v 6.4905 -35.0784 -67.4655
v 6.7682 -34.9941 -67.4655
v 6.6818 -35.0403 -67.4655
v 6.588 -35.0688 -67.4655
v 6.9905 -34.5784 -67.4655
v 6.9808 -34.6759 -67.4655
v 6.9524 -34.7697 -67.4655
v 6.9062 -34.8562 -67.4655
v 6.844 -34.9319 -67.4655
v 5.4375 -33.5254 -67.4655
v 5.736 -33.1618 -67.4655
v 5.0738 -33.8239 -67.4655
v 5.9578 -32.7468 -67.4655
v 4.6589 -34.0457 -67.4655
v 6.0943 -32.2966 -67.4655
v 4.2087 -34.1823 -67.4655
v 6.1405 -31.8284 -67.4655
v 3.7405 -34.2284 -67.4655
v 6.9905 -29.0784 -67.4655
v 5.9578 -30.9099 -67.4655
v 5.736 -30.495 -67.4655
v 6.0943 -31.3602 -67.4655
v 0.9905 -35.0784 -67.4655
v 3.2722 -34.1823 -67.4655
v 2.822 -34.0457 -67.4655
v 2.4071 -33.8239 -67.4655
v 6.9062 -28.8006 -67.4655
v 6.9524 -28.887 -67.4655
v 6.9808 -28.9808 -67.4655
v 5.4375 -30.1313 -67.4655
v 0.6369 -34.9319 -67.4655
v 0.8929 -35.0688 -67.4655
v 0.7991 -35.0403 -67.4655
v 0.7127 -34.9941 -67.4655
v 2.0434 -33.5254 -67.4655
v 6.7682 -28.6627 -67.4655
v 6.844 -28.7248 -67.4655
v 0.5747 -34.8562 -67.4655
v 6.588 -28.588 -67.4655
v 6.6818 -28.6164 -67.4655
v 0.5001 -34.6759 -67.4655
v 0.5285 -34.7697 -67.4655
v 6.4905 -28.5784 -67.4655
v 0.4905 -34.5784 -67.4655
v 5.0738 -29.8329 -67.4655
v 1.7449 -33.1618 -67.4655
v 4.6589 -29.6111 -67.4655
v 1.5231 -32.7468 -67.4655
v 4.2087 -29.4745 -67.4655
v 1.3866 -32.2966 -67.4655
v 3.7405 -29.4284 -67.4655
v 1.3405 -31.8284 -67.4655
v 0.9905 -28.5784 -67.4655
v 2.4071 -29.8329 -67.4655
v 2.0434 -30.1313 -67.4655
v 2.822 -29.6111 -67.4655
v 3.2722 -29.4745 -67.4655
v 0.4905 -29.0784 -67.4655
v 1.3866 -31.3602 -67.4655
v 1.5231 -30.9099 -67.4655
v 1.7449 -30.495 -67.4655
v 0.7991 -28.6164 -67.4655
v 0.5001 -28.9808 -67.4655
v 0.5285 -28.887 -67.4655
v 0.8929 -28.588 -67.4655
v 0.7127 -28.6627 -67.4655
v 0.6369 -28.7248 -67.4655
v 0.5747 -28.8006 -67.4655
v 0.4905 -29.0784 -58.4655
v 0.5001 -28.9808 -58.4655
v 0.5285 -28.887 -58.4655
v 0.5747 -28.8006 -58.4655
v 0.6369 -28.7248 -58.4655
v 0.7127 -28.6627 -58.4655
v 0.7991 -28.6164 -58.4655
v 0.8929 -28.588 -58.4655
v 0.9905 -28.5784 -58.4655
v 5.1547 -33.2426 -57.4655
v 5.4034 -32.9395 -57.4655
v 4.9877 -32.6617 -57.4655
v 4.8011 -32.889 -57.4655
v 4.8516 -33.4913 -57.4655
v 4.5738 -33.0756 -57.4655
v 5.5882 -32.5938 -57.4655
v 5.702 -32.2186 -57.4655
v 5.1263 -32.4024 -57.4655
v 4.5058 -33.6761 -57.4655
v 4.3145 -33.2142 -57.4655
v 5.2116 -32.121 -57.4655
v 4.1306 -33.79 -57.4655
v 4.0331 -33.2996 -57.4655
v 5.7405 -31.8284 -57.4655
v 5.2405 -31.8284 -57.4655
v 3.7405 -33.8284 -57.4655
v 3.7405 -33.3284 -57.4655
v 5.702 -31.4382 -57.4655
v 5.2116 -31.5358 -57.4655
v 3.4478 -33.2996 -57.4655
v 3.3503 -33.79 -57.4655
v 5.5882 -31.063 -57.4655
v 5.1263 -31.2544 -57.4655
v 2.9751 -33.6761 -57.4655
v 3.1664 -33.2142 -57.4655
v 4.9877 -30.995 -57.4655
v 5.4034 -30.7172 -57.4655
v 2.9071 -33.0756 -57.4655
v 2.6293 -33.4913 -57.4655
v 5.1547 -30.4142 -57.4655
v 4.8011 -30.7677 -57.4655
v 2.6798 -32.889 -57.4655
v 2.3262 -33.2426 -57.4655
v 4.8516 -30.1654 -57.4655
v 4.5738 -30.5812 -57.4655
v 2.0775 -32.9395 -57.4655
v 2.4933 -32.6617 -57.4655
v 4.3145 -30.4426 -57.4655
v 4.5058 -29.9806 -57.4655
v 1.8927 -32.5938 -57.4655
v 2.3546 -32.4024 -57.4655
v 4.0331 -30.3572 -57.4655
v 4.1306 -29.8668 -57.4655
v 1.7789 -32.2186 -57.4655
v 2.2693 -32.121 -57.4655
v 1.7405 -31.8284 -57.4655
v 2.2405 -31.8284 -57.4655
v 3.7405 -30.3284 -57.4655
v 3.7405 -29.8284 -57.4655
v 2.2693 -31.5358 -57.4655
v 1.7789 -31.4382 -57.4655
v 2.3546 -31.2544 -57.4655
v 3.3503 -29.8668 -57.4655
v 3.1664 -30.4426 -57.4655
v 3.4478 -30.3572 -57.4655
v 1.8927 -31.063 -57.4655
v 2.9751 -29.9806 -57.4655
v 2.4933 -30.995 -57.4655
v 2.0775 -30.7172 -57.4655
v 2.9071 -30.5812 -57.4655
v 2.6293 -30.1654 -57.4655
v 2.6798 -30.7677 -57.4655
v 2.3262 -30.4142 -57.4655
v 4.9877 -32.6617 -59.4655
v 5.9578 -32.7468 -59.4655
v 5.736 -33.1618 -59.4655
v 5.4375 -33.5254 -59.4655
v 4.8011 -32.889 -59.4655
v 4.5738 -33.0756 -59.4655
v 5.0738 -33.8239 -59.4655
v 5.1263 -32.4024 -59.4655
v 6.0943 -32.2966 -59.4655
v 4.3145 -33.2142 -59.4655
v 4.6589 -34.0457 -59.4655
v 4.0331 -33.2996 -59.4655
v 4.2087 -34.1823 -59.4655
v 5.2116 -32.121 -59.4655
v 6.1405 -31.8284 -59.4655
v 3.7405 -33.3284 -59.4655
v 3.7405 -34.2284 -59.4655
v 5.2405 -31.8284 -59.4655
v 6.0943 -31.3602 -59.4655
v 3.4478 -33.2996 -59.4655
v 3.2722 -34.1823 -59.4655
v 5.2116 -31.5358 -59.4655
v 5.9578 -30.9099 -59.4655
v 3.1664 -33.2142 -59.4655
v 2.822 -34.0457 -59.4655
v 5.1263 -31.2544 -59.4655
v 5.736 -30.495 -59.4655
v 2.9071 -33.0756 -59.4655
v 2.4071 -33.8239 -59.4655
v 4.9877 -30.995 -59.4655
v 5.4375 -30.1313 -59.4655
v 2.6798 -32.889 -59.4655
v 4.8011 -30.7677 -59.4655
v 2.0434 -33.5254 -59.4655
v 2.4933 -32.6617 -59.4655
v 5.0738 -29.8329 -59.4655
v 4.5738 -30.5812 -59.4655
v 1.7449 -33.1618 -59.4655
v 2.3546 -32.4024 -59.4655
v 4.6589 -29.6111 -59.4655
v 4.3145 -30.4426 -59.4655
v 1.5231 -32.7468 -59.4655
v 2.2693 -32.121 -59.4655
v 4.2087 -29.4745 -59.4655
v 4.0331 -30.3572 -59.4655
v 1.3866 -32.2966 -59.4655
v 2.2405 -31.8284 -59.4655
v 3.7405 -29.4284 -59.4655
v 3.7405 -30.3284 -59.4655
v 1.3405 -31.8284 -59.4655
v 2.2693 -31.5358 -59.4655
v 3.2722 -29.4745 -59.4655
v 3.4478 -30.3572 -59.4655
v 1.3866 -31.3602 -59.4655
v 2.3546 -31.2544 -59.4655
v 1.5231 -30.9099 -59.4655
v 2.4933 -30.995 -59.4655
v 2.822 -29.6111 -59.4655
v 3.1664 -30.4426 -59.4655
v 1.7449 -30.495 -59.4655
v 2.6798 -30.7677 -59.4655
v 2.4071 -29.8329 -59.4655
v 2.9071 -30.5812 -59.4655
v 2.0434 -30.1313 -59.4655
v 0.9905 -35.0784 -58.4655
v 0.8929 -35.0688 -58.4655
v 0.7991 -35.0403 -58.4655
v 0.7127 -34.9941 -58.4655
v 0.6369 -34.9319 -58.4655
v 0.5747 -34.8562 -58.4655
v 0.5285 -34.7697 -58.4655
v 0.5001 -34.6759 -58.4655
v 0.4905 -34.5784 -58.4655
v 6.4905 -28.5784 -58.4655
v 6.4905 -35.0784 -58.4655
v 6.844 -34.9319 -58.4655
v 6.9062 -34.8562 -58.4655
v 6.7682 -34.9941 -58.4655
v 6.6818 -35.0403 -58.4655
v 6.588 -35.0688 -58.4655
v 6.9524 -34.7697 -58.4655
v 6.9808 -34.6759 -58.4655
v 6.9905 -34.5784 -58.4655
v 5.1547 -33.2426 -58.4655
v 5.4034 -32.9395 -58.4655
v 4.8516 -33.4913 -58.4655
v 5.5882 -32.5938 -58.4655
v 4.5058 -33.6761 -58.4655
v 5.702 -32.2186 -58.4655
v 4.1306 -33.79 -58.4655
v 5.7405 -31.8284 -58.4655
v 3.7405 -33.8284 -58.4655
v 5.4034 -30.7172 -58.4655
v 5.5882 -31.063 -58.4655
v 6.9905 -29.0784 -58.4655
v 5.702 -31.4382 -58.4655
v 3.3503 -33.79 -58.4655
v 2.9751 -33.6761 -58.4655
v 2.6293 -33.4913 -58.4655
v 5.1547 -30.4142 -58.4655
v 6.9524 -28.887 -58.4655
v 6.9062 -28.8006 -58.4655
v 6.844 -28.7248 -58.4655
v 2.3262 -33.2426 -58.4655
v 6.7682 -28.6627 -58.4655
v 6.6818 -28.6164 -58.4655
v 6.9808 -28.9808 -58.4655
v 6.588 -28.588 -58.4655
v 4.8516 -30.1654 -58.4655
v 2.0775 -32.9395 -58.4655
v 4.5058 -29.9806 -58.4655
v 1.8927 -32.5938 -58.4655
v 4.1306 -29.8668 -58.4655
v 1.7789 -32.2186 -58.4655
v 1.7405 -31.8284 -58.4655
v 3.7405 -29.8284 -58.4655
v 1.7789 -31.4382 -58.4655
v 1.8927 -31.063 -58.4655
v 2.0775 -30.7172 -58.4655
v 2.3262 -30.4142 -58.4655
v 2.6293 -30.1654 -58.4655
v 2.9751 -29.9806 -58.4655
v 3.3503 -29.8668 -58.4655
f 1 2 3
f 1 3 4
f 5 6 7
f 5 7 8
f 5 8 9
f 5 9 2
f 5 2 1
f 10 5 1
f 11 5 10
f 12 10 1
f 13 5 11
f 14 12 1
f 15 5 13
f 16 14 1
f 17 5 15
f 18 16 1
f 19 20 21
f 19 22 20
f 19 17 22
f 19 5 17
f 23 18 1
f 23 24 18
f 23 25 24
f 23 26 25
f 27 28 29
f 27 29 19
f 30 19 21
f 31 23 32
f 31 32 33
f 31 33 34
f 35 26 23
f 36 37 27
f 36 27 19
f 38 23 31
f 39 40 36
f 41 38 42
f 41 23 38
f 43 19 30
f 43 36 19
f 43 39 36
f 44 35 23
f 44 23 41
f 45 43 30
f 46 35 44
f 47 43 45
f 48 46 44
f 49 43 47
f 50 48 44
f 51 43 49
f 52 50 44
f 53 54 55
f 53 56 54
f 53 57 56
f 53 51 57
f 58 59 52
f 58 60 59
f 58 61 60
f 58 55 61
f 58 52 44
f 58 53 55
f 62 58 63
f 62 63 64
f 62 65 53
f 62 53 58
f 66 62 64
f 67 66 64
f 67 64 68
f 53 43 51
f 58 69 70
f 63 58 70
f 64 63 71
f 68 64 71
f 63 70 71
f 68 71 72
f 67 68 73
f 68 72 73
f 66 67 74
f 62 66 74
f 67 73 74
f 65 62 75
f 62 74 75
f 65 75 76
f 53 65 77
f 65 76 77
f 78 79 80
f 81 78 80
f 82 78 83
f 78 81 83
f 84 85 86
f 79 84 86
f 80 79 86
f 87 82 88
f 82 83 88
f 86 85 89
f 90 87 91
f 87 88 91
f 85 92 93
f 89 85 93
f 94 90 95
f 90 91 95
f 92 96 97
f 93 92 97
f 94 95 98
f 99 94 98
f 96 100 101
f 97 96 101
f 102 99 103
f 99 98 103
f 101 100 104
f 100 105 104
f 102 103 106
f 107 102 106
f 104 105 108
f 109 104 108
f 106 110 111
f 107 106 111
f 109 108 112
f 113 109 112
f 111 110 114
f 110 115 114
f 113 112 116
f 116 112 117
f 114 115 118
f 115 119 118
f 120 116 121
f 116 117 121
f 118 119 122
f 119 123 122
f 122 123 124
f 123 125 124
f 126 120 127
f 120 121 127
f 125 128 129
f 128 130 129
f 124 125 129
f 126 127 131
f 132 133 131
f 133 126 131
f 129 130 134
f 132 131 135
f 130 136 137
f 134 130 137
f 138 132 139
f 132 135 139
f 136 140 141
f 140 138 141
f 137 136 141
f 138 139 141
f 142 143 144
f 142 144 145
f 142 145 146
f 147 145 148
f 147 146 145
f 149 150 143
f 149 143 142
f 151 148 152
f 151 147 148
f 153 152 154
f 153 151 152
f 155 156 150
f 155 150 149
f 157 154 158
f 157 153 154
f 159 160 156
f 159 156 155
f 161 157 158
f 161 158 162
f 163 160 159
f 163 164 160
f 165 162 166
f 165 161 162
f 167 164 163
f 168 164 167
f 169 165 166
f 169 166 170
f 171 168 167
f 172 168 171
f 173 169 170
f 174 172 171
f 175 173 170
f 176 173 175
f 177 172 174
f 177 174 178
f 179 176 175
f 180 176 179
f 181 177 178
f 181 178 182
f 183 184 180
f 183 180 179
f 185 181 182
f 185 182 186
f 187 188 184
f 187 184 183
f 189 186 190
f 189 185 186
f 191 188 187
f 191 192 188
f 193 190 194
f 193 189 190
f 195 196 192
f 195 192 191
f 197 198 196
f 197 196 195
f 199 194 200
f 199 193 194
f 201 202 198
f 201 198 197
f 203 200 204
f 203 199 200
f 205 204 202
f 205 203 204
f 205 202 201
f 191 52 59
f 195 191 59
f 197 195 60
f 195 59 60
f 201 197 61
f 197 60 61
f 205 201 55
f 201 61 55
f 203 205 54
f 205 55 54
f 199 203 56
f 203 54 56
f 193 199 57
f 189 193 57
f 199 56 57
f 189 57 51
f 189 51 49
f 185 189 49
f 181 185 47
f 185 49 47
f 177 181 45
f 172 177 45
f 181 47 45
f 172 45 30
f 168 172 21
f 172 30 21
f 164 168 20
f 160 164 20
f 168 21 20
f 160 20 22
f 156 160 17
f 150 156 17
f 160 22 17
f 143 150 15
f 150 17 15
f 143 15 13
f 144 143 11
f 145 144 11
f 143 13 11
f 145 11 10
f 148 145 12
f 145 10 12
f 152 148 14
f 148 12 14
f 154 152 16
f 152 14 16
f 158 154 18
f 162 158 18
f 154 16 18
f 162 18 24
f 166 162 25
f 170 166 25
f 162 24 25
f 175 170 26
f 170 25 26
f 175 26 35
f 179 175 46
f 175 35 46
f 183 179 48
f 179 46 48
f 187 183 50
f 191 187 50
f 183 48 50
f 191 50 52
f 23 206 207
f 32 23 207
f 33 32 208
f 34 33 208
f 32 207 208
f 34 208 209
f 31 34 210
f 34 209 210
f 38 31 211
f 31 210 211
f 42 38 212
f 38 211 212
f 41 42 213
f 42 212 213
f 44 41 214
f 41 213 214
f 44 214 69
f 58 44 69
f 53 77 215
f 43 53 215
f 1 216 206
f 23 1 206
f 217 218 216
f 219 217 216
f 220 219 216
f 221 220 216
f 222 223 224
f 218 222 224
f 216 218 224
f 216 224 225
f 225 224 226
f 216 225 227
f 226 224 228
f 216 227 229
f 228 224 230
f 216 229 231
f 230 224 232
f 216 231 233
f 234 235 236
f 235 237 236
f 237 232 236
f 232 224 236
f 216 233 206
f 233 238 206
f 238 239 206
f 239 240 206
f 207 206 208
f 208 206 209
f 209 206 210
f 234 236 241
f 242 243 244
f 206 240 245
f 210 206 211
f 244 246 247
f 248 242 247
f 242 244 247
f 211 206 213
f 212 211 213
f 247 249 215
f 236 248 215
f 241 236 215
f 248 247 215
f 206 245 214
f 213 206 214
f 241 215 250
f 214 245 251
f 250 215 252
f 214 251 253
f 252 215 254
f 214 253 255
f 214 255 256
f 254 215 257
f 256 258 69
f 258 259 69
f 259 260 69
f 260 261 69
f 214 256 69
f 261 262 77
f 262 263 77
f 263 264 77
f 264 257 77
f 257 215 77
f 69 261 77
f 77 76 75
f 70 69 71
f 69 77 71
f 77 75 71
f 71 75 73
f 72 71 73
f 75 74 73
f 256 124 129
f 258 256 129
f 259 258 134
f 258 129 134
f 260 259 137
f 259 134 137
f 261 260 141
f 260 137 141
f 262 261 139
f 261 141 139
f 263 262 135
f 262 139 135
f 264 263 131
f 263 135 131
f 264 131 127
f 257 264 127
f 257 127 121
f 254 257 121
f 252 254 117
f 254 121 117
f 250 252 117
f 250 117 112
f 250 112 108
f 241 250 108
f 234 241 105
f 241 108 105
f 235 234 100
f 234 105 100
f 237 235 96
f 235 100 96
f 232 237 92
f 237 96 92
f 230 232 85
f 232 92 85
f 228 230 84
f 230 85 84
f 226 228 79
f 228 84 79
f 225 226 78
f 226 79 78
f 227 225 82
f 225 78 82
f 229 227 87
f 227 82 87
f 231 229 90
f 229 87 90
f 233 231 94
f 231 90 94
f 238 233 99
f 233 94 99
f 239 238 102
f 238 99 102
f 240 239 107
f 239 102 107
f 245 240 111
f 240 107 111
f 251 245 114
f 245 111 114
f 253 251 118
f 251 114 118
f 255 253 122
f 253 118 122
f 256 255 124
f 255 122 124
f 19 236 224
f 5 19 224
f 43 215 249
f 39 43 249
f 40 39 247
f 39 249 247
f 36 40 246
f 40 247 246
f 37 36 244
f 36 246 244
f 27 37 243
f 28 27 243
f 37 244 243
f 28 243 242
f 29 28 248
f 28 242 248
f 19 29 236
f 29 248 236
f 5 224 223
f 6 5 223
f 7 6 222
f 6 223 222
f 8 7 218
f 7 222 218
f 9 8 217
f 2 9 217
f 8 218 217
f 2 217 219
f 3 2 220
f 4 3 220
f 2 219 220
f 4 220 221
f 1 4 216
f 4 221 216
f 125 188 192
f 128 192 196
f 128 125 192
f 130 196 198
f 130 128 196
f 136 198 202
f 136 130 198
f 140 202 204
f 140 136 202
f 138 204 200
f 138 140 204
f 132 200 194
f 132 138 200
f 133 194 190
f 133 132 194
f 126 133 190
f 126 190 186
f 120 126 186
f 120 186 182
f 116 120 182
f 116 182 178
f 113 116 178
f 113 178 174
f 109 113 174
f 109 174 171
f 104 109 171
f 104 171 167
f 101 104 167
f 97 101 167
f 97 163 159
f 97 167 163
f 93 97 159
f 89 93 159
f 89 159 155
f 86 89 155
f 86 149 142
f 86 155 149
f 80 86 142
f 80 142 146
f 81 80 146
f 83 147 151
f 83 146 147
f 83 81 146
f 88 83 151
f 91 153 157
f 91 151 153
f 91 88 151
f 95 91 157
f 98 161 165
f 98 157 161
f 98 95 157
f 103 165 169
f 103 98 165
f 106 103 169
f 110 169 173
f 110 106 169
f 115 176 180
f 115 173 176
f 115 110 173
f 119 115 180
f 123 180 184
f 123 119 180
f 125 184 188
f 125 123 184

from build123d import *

# Parameters (mm, degrees)
SKETCH2_R           = 1.5
BOSS_EXTRUDE1_DEPTH = 10
SKETCH3_R           = 2
CUT_EXTRUDE1_DEPTH  = 1
SKETCH4_R           = 2.4
CUT_EXTRUDE2_DEPTH  = 8


with BuildPart() as part:
    # Sketch2 → Boss-Extrude1 (new body)
    with BuildSketch(Plane(origin=(0, 0, -57.465471353), x_dir=(-1, 0, 0), z_dir=(0, 0, -1))):
        with BuildLine():
            Line((-6.490457264, -35.078386779), (-0.990457264, -35.078386779))
            ThreePointArc((-0.990457264, -35.078386779), (-0.636903873, -34.931940169), (-0.490457264, -34.578386779))
            Line((-0.490457264, -34.578386779), (-0.490457264, -29.078386779))
            ThreePointArc((-0.490457264, -29.078386779), (-0.636903873, -28.724833388), (-0.990457264, -28.578386779))
            Line((-0.990457264, -28.578386779), (-6.490457264, -28.578386779))
            ThreePointArc((-6.490457264, -28.578386779), (-6.844010654, -28.724833388), (-6.990457264, -29.078386779))
            Line((-6.990457264, -29.078386779), (-6.990457264, -34.578386779))
            ThreePointArc((-6.990457264, -34.578386779), (-6.844010654, -34.931940169), (-6.490457264, -35.078386779))
        make_face()
        with Locations((-3.740457264, -31.828386779)):
            Circle(SKETCH2_R, mode=Mode.SUBTRACT)
    extrude(amount=BOSS_EXTRUDE1_DEPTH)

    # Sketch3 → Cut-Extrude1 (cut)
    with BuildSketch(Plane(origin=(0, 0, -57.465471353), x_dir=(-1, 0, 0), z_dir=(0, 0, -1))):
        with BuildLine():
            Line((-0.990457264, -28.578386779), (-6.490457264, -28.578386779))
            ThreePointArc((-6.490457264, -28.578386779), (-6.844010654, -28.724833388), (-6.990457264, -29.078386779))
            Line((-6.990457264, -29.078386779), (-6.990457264, -34.578386779))
            ThreePointArc((-6.990457264, -34.578386779), (-6.844010654, -34.931940169), (-6.490457264, -35.078386779))
            Line((-6.490457264, -35.078386779), (-0.990457264, -35.078386779))
            ThreePointArc((-0.990457264, -35.078386779), (-0.636903873, -34.931940169), (-0.490457264, -34.578386779))
            Line((-0.490457264, -34.578386779), (-0.490457264, -29.078386779))
            ThreePointArc((-0.490457264, -29.078386779), (-0.636903873, -28.724833388), (-0.990457264, -28.578386779))
        make_face()
        with Locations((-3.740457264, -31.828386779)):
            Circle(SKETCH3_R, mode=Mode.SUBTRACT)
    extrude(amount=CUT_EXTRUDE1_DEPTH, mode=Mode.SUBTRACT)

    # Sketch4 → Cut-Extrude2 (cut)
    with BuildSketch(Plane(origin=(0, 0, -67.465471353), x_dir=(-1, 0, 0), z_dir=(0, 0, -1))):
        with Locations((-3.740457264, -31.828386779)):
            Circle(SKETCH4_R)
    extrude(amount=-CUT_EXTRUDE2_DEPTH, mode=Mode.SUBTRACT)


solid = part.part
